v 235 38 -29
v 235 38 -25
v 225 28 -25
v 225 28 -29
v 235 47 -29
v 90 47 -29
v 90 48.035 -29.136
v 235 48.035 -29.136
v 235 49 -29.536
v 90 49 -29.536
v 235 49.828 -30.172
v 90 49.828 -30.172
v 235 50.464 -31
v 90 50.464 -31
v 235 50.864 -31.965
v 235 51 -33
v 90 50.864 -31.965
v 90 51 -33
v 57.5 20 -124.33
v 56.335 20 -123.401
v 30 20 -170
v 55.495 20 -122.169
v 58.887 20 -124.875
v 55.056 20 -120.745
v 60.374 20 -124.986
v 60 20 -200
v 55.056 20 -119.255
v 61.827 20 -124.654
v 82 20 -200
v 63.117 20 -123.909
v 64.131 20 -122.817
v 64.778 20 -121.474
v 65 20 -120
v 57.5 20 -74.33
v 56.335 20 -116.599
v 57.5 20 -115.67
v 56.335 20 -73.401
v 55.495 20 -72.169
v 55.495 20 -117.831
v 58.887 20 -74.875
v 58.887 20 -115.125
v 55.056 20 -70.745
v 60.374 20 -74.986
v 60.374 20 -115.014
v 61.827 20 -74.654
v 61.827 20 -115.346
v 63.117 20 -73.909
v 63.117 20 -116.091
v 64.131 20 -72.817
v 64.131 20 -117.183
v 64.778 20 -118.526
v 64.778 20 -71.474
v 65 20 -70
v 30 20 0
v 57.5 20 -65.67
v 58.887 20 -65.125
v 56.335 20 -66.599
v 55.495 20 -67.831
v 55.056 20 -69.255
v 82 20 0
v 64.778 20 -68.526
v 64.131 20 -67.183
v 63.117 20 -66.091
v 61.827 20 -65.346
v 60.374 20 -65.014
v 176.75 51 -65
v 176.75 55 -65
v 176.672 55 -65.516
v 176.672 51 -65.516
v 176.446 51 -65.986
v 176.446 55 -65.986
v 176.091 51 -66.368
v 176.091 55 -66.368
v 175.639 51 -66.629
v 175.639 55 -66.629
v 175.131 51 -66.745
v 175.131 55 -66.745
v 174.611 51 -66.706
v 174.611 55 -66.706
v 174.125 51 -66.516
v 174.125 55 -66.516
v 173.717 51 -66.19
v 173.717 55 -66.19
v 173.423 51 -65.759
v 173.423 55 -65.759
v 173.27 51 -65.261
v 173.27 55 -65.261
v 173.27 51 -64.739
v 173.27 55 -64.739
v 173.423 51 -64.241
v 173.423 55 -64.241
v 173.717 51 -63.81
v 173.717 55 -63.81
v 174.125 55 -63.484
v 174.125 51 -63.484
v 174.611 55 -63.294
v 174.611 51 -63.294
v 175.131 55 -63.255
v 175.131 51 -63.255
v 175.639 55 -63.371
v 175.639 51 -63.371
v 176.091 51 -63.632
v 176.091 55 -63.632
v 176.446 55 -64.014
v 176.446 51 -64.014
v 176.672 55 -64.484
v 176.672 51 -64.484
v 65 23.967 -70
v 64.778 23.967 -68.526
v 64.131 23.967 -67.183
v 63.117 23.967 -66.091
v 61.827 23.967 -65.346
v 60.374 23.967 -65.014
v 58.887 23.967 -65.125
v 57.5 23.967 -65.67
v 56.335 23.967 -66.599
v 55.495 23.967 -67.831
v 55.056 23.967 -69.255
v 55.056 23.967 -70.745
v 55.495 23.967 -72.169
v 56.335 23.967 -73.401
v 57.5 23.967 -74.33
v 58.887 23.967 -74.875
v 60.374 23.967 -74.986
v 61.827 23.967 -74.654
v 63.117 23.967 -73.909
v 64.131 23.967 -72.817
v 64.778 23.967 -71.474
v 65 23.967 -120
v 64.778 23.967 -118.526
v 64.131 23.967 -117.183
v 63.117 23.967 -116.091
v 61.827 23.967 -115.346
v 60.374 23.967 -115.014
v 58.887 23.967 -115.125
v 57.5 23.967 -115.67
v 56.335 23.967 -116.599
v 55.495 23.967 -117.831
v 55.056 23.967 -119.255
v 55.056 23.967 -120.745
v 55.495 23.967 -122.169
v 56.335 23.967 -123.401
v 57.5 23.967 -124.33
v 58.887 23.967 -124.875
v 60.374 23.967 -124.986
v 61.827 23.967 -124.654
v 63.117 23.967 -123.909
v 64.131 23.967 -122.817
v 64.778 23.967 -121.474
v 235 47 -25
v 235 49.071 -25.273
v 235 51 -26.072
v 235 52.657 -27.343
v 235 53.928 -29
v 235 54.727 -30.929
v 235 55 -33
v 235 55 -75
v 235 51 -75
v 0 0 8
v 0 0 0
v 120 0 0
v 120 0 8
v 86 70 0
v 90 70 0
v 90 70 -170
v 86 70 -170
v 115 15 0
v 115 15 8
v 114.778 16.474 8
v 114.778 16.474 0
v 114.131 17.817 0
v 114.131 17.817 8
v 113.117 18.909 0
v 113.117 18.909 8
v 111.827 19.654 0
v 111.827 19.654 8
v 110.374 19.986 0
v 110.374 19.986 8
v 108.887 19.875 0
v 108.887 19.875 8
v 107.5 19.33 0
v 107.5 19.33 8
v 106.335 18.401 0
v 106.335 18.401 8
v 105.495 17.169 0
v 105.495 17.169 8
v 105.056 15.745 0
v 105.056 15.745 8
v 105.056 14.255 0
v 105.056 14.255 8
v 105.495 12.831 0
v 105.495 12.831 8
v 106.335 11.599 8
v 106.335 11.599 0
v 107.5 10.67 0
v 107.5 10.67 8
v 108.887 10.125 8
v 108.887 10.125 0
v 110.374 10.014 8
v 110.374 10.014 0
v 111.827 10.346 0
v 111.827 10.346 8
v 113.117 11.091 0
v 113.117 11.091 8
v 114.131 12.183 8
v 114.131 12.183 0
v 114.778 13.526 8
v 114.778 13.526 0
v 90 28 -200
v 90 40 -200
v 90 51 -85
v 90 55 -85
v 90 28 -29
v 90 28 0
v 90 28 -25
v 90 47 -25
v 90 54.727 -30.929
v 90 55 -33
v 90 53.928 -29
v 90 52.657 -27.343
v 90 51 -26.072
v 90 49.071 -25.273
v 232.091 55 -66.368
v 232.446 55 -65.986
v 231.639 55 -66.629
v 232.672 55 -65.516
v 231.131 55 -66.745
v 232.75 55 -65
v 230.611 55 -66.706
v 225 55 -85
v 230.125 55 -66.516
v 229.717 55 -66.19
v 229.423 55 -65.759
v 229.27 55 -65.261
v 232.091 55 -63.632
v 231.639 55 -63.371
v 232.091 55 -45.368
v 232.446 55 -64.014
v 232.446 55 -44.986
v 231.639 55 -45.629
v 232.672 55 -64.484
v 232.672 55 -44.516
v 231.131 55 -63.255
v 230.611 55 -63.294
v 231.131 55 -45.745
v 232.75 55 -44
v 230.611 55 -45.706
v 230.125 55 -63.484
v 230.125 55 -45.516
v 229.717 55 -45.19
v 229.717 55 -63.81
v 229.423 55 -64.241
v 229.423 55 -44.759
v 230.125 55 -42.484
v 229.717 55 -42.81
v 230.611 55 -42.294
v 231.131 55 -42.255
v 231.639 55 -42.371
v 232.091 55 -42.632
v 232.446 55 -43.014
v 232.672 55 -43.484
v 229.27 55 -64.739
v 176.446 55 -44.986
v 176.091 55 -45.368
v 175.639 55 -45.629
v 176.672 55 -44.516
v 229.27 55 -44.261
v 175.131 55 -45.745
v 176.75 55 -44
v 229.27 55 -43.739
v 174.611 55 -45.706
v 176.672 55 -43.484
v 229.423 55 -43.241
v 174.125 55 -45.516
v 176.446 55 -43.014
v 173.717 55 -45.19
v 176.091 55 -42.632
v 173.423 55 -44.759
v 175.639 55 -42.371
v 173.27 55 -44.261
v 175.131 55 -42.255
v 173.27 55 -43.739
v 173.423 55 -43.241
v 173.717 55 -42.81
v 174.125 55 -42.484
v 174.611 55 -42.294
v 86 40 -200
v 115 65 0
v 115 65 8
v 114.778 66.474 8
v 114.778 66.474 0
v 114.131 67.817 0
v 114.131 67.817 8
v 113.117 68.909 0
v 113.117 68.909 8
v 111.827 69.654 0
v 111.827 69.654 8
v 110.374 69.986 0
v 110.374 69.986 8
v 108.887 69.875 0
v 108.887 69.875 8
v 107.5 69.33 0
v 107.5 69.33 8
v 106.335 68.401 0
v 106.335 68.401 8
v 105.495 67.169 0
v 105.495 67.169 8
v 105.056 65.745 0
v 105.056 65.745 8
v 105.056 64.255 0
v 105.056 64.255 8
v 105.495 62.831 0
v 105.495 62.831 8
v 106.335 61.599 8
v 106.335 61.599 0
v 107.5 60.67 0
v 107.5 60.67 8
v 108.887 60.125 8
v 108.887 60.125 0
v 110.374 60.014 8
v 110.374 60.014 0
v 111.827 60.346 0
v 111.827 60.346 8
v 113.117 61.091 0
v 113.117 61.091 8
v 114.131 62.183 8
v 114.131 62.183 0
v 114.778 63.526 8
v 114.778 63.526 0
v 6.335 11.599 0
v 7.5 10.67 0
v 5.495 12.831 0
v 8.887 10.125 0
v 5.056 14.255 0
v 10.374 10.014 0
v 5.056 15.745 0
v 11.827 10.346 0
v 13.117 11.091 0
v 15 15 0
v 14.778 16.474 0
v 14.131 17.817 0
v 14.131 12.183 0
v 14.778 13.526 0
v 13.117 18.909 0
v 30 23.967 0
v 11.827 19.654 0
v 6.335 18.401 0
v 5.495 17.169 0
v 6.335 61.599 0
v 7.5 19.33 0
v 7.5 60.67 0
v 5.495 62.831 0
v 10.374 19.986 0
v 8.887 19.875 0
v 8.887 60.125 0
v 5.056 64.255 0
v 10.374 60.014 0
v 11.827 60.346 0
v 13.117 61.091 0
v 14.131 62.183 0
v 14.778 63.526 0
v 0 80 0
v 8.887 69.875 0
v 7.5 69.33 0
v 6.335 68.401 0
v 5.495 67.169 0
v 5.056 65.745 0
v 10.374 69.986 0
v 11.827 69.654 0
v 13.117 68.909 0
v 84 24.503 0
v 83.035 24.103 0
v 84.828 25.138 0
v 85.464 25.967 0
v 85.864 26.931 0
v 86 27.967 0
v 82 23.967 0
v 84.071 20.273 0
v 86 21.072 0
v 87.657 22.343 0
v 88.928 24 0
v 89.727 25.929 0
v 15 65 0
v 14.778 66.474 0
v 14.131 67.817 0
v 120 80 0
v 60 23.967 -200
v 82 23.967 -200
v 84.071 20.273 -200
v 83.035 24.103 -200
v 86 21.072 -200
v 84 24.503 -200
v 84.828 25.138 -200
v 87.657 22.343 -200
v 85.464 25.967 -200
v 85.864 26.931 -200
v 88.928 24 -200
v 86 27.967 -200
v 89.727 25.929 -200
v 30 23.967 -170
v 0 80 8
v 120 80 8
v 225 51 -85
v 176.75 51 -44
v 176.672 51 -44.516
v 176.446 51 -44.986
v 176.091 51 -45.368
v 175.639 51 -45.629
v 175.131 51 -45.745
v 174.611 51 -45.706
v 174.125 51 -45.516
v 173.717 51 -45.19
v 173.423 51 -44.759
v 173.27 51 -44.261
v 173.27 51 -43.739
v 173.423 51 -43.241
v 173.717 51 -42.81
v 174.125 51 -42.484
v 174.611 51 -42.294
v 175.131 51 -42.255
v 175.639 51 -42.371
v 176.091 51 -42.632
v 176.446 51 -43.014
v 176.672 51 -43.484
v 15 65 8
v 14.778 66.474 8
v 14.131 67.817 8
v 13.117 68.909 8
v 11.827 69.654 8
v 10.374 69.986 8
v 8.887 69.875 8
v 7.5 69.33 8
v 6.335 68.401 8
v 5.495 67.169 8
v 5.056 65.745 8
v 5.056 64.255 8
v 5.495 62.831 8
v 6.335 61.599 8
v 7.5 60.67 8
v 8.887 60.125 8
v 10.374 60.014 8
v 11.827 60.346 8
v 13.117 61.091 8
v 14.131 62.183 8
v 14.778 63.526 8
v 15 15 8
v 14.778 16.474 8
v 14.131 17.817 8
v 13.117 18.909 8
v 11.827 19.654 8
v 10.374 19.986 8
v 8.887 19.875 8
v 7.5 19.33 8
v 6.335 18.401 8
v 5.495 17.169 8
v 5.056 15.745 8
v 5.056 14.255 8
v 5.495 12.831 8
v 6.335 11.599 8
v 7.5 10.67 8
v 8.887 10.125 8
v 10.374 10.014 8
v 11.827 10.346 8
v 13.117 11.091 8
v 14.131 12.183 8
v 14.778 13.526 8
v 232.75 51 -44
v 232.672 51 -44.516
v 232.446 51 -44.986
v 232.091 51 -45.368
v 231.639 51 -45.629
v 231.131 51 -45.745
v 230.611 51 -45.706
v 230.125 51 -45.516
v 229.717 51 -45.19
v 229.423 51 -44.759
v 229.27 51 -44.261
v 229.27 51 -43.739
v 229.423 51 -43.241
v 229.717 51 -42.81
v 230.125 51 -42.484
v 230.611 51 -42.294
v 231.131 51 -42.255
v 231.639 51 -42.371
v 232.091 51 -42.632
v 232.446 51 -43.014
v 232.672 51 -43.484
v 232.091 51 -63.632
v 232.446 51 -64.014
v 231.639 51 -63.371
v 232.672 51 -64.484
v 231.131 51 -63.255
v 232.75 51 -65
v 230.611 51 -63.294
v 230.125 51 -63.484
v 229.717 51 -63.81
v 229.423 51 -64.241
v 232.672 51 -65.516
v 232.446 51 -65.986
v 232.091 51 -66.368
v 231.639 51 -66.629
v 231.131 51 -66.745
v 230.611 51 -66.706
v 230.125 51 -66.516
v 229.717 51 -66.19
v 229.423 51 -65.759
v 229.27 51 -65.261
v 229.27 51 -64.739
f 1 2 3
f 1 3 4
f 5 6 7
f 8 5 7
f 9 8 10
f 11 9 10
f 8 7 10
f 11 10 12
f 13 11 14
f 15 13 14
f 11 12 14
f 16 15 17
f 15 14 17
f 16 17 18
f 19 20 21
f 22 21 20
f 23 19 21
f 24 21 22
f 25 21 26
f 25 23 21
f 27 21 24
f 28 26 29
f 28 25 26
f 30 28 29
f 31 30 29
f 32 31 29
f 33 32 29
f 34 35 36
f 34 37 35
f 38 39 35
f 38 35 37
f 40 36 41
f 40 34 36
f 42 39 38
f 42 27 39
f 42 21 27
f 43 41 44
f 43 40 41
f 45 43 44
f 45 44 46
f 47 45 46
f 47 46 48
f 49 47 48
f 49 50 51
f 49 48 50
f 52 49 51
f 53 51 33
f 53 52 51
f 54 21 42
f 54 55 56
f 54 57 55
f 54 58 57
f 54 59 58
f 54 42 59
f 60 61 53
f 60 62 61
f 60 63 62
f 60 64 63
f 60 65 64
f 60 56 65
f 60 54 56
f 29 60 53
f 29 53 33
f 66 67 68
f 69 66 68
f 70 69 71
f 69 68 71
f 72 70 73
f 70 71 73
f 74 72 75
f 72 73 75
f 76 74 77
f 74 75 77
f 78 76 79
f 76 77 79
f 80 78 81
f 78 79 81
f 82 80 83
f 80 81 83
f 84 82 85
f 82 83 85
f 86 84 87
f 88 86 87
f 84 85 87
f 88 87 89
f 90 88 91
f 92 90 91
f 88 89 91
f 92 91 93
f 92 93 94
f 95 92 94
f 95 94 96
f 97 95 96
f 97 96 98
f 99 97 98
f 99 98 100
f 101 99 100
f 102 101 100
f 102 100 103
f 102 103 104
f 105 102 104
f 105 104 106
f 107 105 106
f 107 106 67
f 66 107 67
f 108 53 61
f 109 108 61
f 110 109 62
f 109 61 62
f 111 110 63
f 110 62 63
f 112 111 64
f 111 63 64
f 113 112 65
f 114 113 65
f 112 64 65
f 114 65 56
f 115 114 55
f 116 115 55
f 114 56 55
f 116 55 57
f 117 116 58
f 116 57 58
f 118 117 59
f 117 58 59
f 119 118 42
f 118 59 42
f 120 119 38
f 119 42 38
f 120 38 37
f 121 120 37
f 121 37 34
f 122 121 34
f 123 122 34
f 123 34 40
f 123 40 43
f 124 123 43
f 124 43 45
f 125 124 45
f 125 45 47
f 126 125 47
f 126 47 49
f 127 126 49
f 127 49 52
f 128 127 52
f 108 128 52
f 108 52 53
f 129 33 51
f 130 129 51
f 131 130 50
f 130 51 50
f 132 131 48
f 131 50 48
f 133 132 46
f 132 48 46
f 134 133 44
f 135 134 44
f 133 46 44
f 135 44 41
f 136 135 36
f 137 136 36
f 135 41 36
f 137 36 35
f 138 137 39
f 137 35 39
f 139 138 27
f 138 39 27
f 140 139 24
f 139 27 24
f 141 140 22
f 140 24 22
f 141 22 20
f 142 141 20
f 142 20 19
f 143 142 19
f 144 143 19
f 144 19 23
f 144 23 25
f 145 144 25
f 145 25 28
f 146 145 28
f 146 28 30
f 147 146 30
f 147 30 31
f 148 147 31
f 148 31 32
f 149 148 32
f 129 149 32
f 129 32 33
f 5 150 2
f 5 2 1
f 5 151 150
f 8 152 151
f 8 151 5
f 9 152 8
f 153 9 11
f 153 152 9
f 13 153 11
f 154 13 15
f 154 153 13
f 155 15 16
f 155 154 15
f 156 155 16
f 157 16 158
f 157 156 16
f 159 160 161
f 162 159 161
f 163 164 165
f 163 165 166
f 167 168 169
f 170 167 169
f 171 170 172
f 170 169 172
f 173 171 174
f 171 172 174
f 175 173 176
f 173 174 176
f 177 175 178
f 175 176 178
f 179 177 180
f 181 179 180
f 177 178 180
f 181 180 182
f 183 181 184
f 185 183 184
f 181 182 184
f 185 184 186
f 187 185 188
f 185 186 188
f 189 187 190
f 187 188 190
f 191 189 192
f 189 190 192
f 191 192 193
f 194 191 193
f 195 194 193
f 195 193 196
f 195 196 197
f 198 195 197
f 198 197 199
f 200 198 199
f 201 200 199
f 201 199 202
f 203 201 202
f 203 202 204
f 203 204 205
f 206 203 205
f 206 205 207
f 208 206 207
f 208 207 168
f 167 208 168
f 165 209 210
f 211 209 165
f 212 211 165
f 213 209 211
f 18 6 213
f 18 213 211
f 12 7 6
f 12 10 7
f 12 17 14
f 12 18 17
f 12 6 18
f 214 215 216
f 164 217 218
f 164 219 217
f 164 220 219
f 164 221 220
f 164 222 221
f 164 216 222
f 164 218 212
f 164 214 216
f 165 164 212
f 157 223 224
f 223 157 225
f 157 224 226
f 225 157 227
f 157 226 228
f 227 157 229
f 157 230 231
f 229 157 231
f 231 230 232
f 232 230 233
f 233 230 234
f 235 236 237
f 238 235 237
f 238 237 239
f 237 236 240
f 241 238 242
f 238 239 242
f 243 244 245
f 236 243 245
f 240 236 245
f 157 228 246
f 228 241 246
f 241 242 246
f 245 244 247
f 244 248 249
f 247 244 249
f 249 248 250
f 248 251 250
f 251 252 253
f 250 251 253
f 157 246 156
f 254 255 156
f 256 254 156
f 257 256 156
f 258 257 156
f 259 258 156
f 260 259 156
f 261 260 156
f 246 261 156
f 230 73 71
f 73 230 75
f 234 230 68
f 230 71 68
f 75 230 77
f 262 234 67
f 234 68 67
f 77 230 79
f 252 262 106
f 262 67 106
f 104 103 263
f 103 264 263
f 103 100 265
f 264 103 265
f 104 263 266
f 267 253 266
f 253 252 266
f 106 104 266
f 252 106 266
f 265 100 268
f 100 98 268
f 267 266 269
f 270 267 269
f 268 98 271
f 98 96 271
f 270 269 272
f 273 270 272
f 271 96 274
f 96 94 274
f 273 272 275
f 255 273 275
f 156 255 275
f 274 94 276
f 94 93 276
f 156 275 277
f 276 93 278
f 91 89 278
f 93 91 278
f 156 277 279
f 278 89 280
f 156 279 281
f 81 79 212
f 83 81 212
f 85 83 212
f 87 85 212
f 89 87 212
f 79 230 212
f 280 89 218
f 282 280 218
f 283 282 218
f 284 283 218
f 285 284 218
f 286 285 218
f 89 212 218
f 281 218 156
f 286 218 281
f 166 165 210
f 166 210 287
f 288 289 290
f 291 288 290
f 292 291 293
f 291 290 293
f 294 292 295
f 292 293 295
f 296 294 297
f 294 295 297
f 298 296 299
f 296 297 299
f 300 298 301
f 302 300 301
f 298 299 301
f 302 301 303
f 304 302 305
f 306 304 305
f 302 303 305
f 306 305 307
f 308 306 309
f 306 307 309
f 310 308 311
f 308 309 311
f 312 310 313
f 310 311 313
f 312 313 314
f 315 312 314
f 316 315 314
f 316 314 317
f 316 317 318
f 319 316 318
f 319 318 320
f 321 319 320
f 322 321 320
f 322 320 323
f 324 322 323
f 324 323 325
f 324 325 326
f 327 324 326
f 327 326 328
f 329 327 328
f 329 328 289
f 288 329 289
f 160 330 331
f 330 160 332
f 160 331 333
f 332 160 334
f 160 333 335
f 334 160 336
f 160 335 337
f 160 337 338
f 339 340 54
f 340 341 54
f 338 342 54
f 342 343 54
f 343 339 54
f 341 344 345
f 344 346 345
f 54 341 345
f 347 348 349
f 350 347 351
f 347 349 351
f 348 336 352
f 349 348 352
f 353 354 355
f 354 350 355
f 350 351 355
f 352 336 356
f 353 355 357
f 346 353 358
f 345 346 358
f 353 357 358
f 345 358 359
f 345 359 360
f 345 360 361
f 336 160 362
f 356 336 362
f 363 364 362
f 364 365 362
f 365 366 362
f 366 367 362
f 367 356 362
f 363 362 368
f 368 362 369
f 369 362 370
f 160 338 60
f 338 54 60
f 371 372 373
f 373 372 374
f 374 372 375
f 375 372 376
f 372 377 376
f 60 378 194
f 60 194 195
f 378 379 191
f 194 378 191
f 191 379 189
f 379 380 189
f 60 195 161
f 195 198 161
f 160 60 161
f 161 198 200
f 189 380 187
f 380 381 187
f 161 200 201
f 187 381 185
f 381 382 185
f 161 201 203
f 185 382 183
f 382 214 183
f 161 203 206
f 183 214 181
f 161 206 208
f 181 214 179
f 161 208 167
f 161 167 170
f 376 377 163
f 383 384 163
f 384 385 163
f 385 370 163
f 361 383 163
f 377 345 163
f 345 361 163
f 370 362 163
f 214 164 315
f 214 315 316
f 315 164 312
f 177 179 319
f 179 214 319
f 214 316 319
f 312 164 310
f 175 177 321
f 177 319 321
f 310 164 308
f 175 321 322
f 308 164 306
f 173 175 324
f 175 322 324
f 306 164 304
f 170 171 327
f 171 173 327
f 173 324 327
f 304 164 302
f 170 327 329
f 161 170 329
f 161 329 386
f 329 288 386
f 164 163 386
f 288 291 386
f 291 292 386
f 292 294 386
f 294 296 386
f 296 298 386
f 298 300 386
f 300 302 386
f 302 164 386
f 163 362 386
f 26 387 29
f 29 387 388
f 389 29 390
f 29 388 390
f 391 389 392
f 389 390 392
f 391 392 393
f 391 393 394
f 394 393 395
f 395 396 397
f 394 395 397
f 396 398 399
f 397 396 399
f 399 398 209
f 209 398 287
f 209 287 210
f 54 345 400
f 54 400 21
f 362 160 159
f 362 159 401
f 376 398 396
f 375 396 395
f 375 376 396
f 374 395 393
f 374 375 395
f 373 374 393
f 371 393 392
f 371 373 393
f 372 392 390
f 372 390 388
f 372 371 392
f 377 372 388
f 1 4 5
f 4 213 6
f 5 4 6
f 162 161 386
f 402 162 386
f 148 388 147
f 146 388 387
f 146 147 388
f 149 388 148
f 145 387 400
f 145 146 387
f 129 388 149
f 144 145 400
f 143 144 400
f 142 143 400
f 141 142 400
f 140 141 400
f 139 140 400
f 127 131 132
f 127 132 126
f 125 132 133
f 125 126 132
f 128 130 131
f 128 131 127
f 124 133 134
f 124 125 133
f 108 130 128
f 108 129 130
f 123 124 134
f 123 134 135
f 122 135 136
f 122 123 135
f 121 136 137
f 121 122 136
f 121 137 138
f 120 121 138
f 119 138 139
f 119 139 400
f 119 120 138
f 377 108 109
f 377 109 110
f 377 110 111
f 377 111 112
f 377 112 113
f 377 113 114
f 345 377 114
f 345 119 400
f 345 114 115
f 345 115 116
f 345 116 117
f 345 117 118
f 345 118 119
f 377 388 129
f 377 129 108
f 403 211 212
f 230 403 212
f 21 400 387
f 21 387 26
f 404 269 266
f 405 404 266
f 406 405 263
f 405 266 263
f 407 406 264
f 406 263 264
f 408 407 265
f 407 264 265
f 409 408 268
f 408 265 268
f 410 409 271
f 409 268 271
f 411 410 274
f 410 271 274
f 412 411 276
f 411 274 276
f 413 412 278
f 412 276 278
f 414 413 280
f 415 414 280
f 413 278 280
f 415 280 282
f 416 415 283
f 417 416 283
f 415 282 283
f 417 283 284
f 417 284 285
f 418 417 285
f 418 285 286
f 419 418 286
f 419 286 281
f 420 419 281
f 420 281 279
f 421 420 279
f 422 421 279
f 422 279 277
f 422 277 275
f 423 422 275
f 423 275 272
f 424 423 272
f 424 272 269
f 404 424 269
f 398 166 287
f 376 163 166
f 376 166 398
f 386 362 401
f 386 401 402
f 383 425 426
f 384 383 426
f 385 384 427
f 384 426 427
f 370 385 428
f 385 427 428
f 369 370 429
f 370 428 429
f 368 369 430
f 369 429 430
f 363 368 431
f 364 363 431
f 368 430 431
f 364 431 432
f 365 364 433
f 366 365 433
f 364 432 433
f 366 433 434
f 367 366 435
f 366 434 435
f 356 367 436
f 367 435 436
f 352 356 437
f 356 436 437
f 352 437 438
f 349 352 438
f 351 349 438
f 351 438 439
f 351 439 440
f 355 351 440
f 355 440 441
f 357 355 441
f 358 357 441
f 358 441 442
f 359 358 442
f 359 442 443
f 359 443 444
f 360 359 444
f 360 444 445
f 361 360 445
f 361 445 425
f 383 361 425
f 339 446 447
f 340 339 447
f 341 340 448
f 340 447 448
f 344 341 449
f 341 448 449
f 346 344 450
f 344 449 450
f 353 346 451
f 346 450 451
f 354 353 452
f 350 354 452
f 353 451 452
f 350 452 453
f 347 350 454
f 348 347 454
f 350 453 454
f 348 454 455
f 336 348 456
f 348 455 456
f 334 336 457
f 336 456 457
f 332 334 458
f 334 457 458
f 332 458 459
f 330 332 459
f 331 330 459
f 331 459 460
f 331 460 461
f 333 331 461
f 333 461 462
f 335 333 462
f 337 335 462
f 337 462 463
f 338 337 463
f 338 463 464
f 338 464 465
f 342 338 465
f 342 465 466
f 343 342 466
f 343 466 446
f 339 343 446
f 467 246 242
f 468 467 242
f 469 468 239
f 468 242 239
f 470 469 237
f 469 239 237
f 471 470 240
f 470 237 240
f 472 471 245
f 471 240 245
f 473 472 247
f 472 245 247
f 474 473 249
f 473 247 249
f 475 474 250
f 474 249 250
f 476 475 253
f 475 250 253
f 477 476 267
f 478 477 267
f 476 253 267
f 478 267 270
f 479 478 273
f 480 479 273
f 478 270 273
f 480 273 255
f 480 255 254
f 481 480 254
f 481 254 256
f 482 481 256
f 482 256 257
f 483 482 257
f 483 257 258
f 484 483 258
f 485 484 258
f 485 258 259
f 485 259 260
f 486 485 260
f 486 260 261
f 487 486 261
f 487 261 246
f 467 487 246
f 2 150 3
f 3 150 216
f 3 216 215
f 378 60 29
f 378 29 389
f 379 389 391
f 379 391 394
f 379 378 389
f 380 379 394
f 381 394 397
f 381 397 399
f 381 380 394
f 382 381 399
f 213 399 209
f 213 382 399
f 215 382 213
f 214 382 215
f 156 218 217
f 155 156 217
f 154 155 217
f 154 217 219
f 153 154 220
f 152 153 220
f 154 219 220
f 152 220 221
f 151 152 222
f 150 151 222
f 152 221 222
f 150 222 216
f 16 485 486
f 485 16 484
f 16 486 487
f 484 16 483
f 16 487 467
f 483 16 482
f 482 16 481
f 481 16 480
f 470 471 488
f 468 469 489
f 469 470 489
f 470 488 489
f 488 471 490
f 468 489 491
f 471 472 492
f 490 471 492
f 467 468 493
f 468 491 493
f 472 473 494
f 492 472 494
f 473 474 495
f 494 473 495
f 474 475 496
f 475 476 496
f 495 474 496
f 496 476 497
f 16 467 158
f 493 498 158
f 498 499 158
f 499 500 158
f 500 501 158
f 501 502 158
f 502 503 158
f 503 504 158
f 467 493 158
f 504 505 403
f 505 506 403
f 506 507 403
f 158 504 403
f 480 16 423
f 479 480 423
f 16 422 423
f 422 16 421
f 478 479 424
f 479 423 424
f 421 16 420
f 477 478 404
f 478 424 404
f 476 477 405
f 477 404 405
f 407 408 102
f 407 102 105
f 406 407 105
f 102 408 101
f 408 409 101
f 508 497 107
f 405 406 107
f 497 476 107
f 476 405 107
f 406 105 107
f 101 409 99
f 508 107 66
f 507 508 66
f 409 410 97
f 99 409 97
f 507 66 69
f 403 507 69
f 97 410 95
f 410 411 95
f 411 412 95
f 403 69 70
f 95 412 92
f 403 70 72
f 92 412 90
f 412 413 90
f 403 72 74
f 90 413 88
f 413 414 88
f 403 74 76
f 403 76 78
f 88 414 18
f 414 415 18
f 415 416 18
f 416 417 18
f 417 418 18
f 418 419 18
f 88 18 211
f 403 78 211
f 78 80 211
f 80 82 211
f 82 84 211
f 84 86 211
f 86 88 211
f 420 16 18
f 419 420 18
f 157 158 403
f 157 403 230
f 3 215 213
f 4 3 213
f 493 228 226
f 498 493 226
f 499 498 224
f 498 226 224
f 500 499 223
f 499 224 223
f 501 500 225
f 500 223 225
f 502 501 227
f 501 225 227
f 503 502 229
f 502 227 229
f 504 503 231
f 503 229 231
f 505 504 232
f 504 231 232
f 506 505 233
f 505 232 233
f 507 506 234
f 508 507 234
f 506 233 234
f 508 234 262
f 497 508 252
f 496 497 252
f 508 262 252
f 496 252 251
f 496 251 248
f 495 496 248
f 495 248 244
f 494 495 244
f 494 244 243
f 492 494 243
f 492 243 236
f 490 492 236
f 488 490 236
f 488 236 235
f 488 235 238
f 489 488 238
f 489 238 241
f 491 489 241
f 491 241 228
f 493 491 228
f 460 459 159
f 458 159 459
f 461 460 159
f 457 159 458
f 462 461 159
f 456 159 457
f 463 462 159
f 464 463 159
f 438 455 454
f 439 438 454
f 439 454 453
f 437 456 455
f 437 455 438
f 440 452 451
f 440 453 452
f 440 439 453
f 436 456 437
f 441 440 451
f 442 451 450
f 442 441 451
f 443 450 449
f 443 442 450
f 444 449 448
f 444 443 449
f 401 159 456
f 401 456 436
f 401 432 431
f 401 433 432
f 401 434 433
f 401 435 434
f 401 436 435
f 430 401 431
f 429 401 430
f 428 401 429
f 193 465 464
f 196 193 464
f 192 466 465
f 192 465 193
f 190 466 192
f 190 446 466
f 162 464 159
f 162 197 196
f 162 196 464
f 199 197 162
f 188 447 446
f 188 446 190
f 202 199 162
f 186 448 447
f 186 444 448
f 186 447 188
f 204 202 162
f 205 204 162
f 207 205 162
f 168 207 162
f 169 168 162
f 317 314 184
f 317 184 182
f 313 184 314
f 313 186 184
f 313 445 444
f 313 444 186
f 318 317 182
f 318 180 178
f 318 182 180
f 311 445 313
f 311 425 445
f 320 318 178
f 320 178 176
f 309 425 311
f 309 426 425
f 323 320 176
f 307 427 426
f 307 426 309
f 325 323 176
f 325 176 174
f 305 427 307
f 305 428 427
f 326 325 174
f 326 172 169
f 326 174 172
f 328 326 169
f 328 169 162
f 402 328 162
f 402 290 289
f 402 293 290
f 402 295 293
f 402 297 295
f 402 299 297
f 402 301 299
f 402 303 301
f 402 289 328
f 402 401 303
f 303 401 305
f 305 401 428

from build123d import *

# Parameters (mm, degrees)
SKETCH_1_W          = 120
SKETCH_1_H          = 80
EXTRUDE_1_DEPTH     = 8
CUT_EXTRUDE_1_REACH = 10
SKETCH_2_R          = 5
EXTRUDE_2_DEPTH     = 200
CHAMFER_1_SIZE      = 30
CUT_EXTRUDE_3_REACH = 62
SKETCH_5_R          = 5
EXTRUDE_3_DEPTH     = 145
CHAMFER_2_SIZE      = 10
CUT_EXTRUDE_4_REACH = 57
SKETCH_7_R          = 1.75


with BuildPart() as part:
    # 草图1 → 凸台-拉伸1 (new body)
    with BuildSketch(Plane.XY):
        with Locations((60, 40)):
            Rectangle(SKETCH_1_W, SKETCH_1_H)
    extrude(amount=EXTRUDE_1_DEPTH)

    # 草图2 → 切除-拉伸1 (cut, up to next)
    with BuildSketch(Plane.XY.offset(8), mode=Mode.PRIVATE) as cut_extrude_1_sk1:
        with Locations((10, 65)):
            Circle(SKETCH_2_R)
    cut_extrude_1_tool1 = extrude(cut_extrude_1_sk1.sketch, amount=-CUT_EXTRUDE_1_REACH, mode=Mode.PRIVATE) & part.part
    add(cut_extrude_1_tool1.solids().sort_by_distance((10, 65, 8))[0], mode=Mode.SUBTRACT)
    # 草图2 → 切除-拉伸1 (cut, up to next)
    with BuildSketch(Plane.XY.offset(8), mode=Mode.PRIVATE) as cut_extrude_1_sk2:
        with Locations((10, 15)):
            Circle(SKETCH_2_R)
    cut_extrude_1_tool2 = extrude(cut_extrude_1_sk2.sketch, amount=-CUT_EXTRUDE_1_REACH, mode=Mode.PRIVATE) & part.part
    add(cut_extrude_1_tool2.solids().sort_by_distance((10, 15, 8))[0], mode=Mode.SUBTRACT)
    # 草图2 → 切除-拉伸1 (cut, up to next)
    with BuildSketch(Plane.XY.offset(8), mode=Mode.PRIVATE) as cut_extrude_1_sk3:
        with Locations((110, 15)):
            Circle(SKETCH_2_R)
    cut_extrude_1_tool3 = extrude(cut_extrude_1_sk3.sketch, amount=-CUT_EXTRUDE_1_REACH, mode=Mode.PRIVATE) & part.part
    add(cut_extrude_1_tool3.solids().sort_by_distance((110, 15, 8))[0], mode=Mode.SUBTRACT)
    # 草图2 → 切除-拉伸1 (cut, up to next)
    with BuildSketch(Plane.XY.offset(8), mode=Mode.PRIVATE) as cut_extrude_1_sk4:
        with Locations((110, 65)):
            Circle(SKETCH_2_R)
    cut_extrude_1_tool4 = extrude(cut_extrude_1_sk4.sketch, amount=-CUT_EXTRUDE_1_REACH, mode=Mode.PRIVATE) & part.part
    add(cut_extrude_1_tool4.solids().sort_by_distance((110, 65, 8))[0], mode=Mode.SUBTRACT)

    # 草图3 → 凸台-拉伸2 (add)
    with BuildSketch(Plane(origin=(0, 0, 0), x_dir=(-1, 0, 0), z_dir=(0, 0, -1))):
        with BuildLine():
            Line((-30, 20), (-82, 20))
            ThreePointArc((-82, 20), (-87.656854249, 22.343145751), (-90, 28))
            Line((-90, 28), (-90, 70))
            Line((-90, 70), (-86, 70))
            Line((-86, 70), (-86, 27.966747679))
            ThreePointArc((-86, 27.966747679), (-84.828427125, 25.138320554), (-82, 23.966747679))
            Line((-82, 23.966747679), (-30, 23.966747679))
            Line((-30, 23.966747679), (-30, 20))
        make_face()
    extrude(amount=EXTRUDE_2_DEPTH)

    # 倒角1
    chamfer_1_edges = [part.edges().sort_by_distance(p)[0] for p in [
        (30, 21.983373839, -200),
        (88, 70, -200),
    ]]
    chamfer(chamfer_1_edges, length=CHAMFER_1_SIZE)

    # 草图5 → 切除-拉伸3 (cut, up to next)
    with BuildSketch(Plane.XZ.offset(-20), mode=Mode.PRIVATE) as cut_extrude_3_sk1:
        with Locations((60, -70)):
            Circle(SKETCH_5_R)
    cut_extrude_3_tool1 = extrude(cut_extrude_3_sk1.sketch, amount=-CUT_EXTRUDE_3_REACH, mode=Mode.PRIVATE) & part.part
    add(cut_extrude_3_tool1.solids().sort_by_distance((60, 20, -70))[0], mode=Mode.SUBTRACT)
    # 草图5 → 切除-拉伸3 (cut, up to next)
    with BuildSketch(Plane.XZ.offset(-20), mode=Mode.PRIVATE) as cut_extrude_3_sk2:
        with Locations((60, -120)):
            Circle(SKETCH_5_R)
    cut_extrude_3_tool2 = extrude(cut_extrude_3_sk2.sketch, amount=-CUT_EXTRUDE_3_REACH, mode=Mode.PRIVATE) & part.part
    add(cut_extrude_3_tool2.solids().sort_by_distance((60, 20, -120))[0], mode=Mode.SUBTRACT)

    # 草图6 → 凸台-拉伸3 (add)
    with BuildSketch(Plane(origin=(90, 0, 0), x_dir=(0, 0, -1), z_dir=(1, 0, 0))):
        with BuildLine():
            Line((25, 47), (25, 28))
            Line((25, 28), (29, 28))
            Line((29, 28), (29, 47))
            ThreePointArc((29, 47), (30.171572875, 49.828427125), (33, 51))
            Line((33, 51), (85, 51))
            Line((85, 51), (85, 55))
            Line((85, 55), (33, 55))
            ThreePointArc((33, 55), (27.343145751, 52.656854249), (25, 47))
        make_face()
    extrude(amount=EXTRUDE_3_DEPTH)

    # 倒角2
    chamfer_2_edges = [part.edges().sort_by_distance(p)[0] for p in [
        (235, 53, -85),
        (235, 28, -27),
    ]]
    chamfer(chamfer_2_edges, length=CHAMFER_2_SIZE)

    # 草图7 → 切除-拉伸4 (cut, up to next)
    with BuildSketch(Plane(origin=(0, 55, 0), x_dir=(1, 0, 0), z_dir=(0, 1, 0)), mode=Mode.PRIVATE) as cut_extrude_4_sk1:
        with Locations((231, 65)):
            Circle(SKETCH_7_R)
    cut_extrude_4_tool1 = extrude(cut_extrude_4_sk1.sketch, amount=-CUT_EXTRUDE_4_REACH, mode=Mode.PRIVATE) & part.part
    add(cut_extrude_4_tool1.solids().sort_by_distance((231, 55, -65))[0], mode=Mode.SUBTRACT)
    # 草图7 → 切除-拉伸4 (cut, up to next)
    with BuildSketch(Plane(origin=(0, 55, 0), x_dir=(1, 0, 0), z_dir=(0, 1, 0)), mode=Mode.PRIVATE) as cut_extrude_4_sk2:
        with Locations((231, 44)):
            Circle(SKETCH_7_R)
    cut_extrude_4_tool2 = extrude(cut_extrude_4_sk2.sketch, amount=-CUT_EXTRUDE_4_REACH, mode=Mode.PRIVATE) & part.part
    add(cut_extrude_4_tool2.solids().sort_by_distance((231, 55, -44))[0], mode=Mode.SUBTRACT)
    # 草图7 → 切除-拉伸4 (cut, up to next)
    with BuildSketch(Plane(origin=(0, 55, 0), x_dir=(1, 0, 0), z_dir=(0, 1, 0)), mode=Mode.PRIVATE) as cut_extrude_4_sk3:
        with Locations((175, 44)):
            Circle(SKETCH_7_R)
    cut_extrude_4_tool3 = extrude(cut_extrude_4_sk3.sketch, amount=-CUT_EXTRUDE_4_REACH, mode=Mode.PRIVATE) & part.part
    add(cut_extrude_4_tool3.solids().sort_by_distance((175, 55, -44))[0], mode=Mode.SUBTRACT)
    # 草图7 → 切除-拉伸4 (cut, up to next)
    with BuildSketch(Plane(origin=(0, 55, 0), x_dir=(1, 0, 0), z_dir=(0, 1, 0)), mode=Mode.PRIVATE) as cut_extrude_4_sk4:
        with Locations((175, 65)):
            Circle(SKETCH_7_R)
    cut_extrude_4_tool4 = extrude(cut_extrude_4_sk4.sketch, amount=-CUT_EXTRUDE_4_REACH, mode=Mode.PRIVATE) & part.part
    add(cut_extrude_4_tool4.solids().sort_by_distance((175, 55, -65))[0], mode=Mode.SUBTRACT)


solid = part.part
